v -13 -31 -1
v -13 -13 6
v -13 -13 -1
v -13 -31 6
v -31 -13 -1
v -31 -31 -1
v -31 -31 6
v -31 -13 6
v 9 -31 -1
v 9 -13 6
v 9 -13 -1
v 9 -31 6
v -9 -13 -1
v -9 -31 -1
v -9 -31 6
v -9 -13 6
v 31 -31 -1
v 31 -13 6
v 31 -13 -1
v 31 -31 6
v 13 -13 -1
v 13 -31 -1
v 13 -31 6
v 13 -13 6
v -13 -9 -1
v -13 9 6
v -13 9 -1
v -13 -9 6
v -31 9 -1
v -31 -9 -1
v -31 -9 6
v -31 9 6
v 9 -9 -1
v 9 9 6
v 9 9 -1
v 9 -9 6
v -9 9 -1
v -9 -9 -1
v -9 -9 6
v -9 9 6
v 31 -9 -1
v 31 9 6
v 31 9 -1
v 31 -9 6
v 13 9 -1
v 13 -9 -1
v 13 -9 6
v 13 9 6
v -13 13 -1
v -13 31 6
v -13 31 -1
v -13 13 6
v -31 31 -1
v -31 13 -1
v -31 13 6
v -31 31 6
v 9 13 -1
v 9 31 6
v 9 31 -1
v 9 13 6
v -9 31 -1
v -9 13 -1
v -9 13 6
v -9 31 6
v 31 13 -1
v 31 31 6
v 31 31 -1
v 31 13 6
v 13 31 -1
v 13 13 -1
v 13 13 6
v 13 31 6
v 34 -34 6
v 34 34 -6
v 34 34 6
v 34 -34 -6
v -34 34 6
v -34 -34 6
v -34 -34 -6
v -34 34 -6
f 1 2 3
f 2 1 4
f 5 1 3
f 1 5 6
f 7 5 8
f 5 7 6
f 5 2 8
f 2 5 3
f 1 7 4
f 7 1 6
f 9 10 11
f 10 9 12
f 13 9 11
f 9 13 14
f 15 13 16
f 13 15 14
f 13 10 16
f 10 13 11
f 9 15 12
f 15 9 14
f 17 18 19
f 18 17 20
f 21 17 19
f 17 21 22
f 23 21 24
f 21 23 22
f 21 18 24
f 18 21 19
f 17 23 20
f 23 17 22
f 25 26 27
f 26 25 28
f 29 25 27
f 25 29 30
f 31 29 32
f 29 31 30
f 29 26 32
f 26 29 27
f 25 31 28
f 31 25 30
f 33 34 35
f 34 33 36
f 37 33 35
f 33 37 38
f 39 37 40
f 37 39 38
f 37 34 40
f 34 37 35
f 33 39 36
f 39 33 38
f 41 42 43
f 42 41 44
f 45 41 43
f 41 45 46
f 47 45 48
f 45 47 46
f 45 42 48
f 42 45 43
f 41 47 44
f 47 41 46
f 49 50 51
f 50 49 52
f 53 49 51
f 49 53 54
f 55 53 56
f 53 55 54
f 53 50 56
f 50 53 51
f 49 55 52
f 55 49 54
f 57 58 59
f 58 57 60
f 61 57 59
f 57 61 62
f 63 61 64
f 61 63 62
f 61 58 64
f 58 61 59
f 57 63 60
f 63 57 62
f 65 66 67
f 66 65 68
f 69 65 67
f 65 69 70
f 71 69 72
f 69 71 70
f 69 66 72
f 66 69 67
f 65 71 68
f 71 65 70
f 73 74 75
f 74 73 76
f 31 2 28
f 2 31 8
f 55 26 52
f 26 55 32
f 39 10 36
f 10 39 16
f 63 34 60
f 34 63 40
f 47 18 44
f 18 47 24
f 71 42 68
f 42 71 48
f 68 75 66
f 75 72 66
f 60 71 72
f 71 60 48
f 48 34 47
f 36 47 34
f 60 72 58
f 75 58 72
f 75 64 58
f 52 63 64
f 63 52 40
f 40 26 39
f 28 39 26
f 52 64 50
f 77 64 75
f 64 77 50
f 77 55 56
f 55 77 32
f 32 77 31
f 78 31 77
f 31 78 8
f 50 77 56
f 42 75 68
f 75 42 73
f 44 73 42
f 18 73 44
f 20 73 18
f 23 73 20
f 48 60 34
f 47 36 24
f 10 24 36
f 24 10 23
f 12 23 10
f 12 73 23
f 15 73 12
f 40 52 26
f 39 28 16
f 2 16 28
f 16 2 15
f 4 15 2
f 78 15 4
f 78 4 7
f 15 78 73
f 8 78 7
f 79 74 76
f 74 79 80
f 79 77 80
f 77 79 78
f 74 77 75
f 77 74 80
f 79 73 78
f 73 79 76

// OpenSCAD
$fn = 32;

// ----------------------------------------------------------------------
// Pocket plate 68 x 68 x 12
// 3 x 3 pockets 18 mm square, 7 mm deep
// ----------------------------------------------------------------------

// --- parameters (mm) ---
thickness = 12;  // plate thickness
floor_t = 5;     // material left under each pocket
pocket = 18;     // pocket side length
pitch_x = 22;    // pocket pitch along X
pitch_y = 22;    // pocket pitch along Y
cols = 3;        // pockets per row
rows = 3;        // rows of pockets

// --- derived feature positions (mm) ---
depth = thickness - floor_t;        // = 7   pocket depth, down to the floor
span_x = (cols - 1) * pitch_x;      // = 44   distance between outer pockets
span_y = (rows - 1) * pitch_y;      // = 44   distance between outer pocket rows
origin_x = -span_x / 2;             // = -22   X of the first pocket
origin_y = -span_y / 2;             // = -22   Y of the first pocket
plate = [span_x + pocket + 6, span_y + pocket + 6, thickness];  // = [68, 68, 12]   overall size: pockets plus 3 mm of wall on each side
feature_centers = [
  [origin_x + 0 * pitch_x, origin_y + 0 * pitch_y],
  [origin_x + 1 * pitch_x, origin_y + 0 * pitch_y],
  [origin_x + 2 * pitch_x, origin_y + 0 * pitch_y],
  [origin_x + 0 * pitch_x, origin_y + 1 * pitch_y],
  [origin_x + 1 * pitch_x, origin_y + 1 * pitch_y],
  [origin_x + 2 * pitch_x, origin_y + 1 * pitch_y],
  [origin_x + 0 * pitch_x, origin_y + 2 * pitch_y],
  [origin_x + 1 * pitch_x, origin_y + 2 * pitch_y],
  [origin_x + 2 * pitch_x, origin_y + 2 * pitch_y]
];   // pocket centres, used verbatim by the cutter loop

// plate outline, then one pocket per centre in feature_centers
difference() {
  cube(plate, center = true);
  for (centre = feature_centers)
    translate([centre[0] - pocket / 2, centre[1] - pocket / 2, plate[2] / 2 - depth])
      cube([pocket, pocket, depth + 1]);  // centred on the declared pocket centre
}
